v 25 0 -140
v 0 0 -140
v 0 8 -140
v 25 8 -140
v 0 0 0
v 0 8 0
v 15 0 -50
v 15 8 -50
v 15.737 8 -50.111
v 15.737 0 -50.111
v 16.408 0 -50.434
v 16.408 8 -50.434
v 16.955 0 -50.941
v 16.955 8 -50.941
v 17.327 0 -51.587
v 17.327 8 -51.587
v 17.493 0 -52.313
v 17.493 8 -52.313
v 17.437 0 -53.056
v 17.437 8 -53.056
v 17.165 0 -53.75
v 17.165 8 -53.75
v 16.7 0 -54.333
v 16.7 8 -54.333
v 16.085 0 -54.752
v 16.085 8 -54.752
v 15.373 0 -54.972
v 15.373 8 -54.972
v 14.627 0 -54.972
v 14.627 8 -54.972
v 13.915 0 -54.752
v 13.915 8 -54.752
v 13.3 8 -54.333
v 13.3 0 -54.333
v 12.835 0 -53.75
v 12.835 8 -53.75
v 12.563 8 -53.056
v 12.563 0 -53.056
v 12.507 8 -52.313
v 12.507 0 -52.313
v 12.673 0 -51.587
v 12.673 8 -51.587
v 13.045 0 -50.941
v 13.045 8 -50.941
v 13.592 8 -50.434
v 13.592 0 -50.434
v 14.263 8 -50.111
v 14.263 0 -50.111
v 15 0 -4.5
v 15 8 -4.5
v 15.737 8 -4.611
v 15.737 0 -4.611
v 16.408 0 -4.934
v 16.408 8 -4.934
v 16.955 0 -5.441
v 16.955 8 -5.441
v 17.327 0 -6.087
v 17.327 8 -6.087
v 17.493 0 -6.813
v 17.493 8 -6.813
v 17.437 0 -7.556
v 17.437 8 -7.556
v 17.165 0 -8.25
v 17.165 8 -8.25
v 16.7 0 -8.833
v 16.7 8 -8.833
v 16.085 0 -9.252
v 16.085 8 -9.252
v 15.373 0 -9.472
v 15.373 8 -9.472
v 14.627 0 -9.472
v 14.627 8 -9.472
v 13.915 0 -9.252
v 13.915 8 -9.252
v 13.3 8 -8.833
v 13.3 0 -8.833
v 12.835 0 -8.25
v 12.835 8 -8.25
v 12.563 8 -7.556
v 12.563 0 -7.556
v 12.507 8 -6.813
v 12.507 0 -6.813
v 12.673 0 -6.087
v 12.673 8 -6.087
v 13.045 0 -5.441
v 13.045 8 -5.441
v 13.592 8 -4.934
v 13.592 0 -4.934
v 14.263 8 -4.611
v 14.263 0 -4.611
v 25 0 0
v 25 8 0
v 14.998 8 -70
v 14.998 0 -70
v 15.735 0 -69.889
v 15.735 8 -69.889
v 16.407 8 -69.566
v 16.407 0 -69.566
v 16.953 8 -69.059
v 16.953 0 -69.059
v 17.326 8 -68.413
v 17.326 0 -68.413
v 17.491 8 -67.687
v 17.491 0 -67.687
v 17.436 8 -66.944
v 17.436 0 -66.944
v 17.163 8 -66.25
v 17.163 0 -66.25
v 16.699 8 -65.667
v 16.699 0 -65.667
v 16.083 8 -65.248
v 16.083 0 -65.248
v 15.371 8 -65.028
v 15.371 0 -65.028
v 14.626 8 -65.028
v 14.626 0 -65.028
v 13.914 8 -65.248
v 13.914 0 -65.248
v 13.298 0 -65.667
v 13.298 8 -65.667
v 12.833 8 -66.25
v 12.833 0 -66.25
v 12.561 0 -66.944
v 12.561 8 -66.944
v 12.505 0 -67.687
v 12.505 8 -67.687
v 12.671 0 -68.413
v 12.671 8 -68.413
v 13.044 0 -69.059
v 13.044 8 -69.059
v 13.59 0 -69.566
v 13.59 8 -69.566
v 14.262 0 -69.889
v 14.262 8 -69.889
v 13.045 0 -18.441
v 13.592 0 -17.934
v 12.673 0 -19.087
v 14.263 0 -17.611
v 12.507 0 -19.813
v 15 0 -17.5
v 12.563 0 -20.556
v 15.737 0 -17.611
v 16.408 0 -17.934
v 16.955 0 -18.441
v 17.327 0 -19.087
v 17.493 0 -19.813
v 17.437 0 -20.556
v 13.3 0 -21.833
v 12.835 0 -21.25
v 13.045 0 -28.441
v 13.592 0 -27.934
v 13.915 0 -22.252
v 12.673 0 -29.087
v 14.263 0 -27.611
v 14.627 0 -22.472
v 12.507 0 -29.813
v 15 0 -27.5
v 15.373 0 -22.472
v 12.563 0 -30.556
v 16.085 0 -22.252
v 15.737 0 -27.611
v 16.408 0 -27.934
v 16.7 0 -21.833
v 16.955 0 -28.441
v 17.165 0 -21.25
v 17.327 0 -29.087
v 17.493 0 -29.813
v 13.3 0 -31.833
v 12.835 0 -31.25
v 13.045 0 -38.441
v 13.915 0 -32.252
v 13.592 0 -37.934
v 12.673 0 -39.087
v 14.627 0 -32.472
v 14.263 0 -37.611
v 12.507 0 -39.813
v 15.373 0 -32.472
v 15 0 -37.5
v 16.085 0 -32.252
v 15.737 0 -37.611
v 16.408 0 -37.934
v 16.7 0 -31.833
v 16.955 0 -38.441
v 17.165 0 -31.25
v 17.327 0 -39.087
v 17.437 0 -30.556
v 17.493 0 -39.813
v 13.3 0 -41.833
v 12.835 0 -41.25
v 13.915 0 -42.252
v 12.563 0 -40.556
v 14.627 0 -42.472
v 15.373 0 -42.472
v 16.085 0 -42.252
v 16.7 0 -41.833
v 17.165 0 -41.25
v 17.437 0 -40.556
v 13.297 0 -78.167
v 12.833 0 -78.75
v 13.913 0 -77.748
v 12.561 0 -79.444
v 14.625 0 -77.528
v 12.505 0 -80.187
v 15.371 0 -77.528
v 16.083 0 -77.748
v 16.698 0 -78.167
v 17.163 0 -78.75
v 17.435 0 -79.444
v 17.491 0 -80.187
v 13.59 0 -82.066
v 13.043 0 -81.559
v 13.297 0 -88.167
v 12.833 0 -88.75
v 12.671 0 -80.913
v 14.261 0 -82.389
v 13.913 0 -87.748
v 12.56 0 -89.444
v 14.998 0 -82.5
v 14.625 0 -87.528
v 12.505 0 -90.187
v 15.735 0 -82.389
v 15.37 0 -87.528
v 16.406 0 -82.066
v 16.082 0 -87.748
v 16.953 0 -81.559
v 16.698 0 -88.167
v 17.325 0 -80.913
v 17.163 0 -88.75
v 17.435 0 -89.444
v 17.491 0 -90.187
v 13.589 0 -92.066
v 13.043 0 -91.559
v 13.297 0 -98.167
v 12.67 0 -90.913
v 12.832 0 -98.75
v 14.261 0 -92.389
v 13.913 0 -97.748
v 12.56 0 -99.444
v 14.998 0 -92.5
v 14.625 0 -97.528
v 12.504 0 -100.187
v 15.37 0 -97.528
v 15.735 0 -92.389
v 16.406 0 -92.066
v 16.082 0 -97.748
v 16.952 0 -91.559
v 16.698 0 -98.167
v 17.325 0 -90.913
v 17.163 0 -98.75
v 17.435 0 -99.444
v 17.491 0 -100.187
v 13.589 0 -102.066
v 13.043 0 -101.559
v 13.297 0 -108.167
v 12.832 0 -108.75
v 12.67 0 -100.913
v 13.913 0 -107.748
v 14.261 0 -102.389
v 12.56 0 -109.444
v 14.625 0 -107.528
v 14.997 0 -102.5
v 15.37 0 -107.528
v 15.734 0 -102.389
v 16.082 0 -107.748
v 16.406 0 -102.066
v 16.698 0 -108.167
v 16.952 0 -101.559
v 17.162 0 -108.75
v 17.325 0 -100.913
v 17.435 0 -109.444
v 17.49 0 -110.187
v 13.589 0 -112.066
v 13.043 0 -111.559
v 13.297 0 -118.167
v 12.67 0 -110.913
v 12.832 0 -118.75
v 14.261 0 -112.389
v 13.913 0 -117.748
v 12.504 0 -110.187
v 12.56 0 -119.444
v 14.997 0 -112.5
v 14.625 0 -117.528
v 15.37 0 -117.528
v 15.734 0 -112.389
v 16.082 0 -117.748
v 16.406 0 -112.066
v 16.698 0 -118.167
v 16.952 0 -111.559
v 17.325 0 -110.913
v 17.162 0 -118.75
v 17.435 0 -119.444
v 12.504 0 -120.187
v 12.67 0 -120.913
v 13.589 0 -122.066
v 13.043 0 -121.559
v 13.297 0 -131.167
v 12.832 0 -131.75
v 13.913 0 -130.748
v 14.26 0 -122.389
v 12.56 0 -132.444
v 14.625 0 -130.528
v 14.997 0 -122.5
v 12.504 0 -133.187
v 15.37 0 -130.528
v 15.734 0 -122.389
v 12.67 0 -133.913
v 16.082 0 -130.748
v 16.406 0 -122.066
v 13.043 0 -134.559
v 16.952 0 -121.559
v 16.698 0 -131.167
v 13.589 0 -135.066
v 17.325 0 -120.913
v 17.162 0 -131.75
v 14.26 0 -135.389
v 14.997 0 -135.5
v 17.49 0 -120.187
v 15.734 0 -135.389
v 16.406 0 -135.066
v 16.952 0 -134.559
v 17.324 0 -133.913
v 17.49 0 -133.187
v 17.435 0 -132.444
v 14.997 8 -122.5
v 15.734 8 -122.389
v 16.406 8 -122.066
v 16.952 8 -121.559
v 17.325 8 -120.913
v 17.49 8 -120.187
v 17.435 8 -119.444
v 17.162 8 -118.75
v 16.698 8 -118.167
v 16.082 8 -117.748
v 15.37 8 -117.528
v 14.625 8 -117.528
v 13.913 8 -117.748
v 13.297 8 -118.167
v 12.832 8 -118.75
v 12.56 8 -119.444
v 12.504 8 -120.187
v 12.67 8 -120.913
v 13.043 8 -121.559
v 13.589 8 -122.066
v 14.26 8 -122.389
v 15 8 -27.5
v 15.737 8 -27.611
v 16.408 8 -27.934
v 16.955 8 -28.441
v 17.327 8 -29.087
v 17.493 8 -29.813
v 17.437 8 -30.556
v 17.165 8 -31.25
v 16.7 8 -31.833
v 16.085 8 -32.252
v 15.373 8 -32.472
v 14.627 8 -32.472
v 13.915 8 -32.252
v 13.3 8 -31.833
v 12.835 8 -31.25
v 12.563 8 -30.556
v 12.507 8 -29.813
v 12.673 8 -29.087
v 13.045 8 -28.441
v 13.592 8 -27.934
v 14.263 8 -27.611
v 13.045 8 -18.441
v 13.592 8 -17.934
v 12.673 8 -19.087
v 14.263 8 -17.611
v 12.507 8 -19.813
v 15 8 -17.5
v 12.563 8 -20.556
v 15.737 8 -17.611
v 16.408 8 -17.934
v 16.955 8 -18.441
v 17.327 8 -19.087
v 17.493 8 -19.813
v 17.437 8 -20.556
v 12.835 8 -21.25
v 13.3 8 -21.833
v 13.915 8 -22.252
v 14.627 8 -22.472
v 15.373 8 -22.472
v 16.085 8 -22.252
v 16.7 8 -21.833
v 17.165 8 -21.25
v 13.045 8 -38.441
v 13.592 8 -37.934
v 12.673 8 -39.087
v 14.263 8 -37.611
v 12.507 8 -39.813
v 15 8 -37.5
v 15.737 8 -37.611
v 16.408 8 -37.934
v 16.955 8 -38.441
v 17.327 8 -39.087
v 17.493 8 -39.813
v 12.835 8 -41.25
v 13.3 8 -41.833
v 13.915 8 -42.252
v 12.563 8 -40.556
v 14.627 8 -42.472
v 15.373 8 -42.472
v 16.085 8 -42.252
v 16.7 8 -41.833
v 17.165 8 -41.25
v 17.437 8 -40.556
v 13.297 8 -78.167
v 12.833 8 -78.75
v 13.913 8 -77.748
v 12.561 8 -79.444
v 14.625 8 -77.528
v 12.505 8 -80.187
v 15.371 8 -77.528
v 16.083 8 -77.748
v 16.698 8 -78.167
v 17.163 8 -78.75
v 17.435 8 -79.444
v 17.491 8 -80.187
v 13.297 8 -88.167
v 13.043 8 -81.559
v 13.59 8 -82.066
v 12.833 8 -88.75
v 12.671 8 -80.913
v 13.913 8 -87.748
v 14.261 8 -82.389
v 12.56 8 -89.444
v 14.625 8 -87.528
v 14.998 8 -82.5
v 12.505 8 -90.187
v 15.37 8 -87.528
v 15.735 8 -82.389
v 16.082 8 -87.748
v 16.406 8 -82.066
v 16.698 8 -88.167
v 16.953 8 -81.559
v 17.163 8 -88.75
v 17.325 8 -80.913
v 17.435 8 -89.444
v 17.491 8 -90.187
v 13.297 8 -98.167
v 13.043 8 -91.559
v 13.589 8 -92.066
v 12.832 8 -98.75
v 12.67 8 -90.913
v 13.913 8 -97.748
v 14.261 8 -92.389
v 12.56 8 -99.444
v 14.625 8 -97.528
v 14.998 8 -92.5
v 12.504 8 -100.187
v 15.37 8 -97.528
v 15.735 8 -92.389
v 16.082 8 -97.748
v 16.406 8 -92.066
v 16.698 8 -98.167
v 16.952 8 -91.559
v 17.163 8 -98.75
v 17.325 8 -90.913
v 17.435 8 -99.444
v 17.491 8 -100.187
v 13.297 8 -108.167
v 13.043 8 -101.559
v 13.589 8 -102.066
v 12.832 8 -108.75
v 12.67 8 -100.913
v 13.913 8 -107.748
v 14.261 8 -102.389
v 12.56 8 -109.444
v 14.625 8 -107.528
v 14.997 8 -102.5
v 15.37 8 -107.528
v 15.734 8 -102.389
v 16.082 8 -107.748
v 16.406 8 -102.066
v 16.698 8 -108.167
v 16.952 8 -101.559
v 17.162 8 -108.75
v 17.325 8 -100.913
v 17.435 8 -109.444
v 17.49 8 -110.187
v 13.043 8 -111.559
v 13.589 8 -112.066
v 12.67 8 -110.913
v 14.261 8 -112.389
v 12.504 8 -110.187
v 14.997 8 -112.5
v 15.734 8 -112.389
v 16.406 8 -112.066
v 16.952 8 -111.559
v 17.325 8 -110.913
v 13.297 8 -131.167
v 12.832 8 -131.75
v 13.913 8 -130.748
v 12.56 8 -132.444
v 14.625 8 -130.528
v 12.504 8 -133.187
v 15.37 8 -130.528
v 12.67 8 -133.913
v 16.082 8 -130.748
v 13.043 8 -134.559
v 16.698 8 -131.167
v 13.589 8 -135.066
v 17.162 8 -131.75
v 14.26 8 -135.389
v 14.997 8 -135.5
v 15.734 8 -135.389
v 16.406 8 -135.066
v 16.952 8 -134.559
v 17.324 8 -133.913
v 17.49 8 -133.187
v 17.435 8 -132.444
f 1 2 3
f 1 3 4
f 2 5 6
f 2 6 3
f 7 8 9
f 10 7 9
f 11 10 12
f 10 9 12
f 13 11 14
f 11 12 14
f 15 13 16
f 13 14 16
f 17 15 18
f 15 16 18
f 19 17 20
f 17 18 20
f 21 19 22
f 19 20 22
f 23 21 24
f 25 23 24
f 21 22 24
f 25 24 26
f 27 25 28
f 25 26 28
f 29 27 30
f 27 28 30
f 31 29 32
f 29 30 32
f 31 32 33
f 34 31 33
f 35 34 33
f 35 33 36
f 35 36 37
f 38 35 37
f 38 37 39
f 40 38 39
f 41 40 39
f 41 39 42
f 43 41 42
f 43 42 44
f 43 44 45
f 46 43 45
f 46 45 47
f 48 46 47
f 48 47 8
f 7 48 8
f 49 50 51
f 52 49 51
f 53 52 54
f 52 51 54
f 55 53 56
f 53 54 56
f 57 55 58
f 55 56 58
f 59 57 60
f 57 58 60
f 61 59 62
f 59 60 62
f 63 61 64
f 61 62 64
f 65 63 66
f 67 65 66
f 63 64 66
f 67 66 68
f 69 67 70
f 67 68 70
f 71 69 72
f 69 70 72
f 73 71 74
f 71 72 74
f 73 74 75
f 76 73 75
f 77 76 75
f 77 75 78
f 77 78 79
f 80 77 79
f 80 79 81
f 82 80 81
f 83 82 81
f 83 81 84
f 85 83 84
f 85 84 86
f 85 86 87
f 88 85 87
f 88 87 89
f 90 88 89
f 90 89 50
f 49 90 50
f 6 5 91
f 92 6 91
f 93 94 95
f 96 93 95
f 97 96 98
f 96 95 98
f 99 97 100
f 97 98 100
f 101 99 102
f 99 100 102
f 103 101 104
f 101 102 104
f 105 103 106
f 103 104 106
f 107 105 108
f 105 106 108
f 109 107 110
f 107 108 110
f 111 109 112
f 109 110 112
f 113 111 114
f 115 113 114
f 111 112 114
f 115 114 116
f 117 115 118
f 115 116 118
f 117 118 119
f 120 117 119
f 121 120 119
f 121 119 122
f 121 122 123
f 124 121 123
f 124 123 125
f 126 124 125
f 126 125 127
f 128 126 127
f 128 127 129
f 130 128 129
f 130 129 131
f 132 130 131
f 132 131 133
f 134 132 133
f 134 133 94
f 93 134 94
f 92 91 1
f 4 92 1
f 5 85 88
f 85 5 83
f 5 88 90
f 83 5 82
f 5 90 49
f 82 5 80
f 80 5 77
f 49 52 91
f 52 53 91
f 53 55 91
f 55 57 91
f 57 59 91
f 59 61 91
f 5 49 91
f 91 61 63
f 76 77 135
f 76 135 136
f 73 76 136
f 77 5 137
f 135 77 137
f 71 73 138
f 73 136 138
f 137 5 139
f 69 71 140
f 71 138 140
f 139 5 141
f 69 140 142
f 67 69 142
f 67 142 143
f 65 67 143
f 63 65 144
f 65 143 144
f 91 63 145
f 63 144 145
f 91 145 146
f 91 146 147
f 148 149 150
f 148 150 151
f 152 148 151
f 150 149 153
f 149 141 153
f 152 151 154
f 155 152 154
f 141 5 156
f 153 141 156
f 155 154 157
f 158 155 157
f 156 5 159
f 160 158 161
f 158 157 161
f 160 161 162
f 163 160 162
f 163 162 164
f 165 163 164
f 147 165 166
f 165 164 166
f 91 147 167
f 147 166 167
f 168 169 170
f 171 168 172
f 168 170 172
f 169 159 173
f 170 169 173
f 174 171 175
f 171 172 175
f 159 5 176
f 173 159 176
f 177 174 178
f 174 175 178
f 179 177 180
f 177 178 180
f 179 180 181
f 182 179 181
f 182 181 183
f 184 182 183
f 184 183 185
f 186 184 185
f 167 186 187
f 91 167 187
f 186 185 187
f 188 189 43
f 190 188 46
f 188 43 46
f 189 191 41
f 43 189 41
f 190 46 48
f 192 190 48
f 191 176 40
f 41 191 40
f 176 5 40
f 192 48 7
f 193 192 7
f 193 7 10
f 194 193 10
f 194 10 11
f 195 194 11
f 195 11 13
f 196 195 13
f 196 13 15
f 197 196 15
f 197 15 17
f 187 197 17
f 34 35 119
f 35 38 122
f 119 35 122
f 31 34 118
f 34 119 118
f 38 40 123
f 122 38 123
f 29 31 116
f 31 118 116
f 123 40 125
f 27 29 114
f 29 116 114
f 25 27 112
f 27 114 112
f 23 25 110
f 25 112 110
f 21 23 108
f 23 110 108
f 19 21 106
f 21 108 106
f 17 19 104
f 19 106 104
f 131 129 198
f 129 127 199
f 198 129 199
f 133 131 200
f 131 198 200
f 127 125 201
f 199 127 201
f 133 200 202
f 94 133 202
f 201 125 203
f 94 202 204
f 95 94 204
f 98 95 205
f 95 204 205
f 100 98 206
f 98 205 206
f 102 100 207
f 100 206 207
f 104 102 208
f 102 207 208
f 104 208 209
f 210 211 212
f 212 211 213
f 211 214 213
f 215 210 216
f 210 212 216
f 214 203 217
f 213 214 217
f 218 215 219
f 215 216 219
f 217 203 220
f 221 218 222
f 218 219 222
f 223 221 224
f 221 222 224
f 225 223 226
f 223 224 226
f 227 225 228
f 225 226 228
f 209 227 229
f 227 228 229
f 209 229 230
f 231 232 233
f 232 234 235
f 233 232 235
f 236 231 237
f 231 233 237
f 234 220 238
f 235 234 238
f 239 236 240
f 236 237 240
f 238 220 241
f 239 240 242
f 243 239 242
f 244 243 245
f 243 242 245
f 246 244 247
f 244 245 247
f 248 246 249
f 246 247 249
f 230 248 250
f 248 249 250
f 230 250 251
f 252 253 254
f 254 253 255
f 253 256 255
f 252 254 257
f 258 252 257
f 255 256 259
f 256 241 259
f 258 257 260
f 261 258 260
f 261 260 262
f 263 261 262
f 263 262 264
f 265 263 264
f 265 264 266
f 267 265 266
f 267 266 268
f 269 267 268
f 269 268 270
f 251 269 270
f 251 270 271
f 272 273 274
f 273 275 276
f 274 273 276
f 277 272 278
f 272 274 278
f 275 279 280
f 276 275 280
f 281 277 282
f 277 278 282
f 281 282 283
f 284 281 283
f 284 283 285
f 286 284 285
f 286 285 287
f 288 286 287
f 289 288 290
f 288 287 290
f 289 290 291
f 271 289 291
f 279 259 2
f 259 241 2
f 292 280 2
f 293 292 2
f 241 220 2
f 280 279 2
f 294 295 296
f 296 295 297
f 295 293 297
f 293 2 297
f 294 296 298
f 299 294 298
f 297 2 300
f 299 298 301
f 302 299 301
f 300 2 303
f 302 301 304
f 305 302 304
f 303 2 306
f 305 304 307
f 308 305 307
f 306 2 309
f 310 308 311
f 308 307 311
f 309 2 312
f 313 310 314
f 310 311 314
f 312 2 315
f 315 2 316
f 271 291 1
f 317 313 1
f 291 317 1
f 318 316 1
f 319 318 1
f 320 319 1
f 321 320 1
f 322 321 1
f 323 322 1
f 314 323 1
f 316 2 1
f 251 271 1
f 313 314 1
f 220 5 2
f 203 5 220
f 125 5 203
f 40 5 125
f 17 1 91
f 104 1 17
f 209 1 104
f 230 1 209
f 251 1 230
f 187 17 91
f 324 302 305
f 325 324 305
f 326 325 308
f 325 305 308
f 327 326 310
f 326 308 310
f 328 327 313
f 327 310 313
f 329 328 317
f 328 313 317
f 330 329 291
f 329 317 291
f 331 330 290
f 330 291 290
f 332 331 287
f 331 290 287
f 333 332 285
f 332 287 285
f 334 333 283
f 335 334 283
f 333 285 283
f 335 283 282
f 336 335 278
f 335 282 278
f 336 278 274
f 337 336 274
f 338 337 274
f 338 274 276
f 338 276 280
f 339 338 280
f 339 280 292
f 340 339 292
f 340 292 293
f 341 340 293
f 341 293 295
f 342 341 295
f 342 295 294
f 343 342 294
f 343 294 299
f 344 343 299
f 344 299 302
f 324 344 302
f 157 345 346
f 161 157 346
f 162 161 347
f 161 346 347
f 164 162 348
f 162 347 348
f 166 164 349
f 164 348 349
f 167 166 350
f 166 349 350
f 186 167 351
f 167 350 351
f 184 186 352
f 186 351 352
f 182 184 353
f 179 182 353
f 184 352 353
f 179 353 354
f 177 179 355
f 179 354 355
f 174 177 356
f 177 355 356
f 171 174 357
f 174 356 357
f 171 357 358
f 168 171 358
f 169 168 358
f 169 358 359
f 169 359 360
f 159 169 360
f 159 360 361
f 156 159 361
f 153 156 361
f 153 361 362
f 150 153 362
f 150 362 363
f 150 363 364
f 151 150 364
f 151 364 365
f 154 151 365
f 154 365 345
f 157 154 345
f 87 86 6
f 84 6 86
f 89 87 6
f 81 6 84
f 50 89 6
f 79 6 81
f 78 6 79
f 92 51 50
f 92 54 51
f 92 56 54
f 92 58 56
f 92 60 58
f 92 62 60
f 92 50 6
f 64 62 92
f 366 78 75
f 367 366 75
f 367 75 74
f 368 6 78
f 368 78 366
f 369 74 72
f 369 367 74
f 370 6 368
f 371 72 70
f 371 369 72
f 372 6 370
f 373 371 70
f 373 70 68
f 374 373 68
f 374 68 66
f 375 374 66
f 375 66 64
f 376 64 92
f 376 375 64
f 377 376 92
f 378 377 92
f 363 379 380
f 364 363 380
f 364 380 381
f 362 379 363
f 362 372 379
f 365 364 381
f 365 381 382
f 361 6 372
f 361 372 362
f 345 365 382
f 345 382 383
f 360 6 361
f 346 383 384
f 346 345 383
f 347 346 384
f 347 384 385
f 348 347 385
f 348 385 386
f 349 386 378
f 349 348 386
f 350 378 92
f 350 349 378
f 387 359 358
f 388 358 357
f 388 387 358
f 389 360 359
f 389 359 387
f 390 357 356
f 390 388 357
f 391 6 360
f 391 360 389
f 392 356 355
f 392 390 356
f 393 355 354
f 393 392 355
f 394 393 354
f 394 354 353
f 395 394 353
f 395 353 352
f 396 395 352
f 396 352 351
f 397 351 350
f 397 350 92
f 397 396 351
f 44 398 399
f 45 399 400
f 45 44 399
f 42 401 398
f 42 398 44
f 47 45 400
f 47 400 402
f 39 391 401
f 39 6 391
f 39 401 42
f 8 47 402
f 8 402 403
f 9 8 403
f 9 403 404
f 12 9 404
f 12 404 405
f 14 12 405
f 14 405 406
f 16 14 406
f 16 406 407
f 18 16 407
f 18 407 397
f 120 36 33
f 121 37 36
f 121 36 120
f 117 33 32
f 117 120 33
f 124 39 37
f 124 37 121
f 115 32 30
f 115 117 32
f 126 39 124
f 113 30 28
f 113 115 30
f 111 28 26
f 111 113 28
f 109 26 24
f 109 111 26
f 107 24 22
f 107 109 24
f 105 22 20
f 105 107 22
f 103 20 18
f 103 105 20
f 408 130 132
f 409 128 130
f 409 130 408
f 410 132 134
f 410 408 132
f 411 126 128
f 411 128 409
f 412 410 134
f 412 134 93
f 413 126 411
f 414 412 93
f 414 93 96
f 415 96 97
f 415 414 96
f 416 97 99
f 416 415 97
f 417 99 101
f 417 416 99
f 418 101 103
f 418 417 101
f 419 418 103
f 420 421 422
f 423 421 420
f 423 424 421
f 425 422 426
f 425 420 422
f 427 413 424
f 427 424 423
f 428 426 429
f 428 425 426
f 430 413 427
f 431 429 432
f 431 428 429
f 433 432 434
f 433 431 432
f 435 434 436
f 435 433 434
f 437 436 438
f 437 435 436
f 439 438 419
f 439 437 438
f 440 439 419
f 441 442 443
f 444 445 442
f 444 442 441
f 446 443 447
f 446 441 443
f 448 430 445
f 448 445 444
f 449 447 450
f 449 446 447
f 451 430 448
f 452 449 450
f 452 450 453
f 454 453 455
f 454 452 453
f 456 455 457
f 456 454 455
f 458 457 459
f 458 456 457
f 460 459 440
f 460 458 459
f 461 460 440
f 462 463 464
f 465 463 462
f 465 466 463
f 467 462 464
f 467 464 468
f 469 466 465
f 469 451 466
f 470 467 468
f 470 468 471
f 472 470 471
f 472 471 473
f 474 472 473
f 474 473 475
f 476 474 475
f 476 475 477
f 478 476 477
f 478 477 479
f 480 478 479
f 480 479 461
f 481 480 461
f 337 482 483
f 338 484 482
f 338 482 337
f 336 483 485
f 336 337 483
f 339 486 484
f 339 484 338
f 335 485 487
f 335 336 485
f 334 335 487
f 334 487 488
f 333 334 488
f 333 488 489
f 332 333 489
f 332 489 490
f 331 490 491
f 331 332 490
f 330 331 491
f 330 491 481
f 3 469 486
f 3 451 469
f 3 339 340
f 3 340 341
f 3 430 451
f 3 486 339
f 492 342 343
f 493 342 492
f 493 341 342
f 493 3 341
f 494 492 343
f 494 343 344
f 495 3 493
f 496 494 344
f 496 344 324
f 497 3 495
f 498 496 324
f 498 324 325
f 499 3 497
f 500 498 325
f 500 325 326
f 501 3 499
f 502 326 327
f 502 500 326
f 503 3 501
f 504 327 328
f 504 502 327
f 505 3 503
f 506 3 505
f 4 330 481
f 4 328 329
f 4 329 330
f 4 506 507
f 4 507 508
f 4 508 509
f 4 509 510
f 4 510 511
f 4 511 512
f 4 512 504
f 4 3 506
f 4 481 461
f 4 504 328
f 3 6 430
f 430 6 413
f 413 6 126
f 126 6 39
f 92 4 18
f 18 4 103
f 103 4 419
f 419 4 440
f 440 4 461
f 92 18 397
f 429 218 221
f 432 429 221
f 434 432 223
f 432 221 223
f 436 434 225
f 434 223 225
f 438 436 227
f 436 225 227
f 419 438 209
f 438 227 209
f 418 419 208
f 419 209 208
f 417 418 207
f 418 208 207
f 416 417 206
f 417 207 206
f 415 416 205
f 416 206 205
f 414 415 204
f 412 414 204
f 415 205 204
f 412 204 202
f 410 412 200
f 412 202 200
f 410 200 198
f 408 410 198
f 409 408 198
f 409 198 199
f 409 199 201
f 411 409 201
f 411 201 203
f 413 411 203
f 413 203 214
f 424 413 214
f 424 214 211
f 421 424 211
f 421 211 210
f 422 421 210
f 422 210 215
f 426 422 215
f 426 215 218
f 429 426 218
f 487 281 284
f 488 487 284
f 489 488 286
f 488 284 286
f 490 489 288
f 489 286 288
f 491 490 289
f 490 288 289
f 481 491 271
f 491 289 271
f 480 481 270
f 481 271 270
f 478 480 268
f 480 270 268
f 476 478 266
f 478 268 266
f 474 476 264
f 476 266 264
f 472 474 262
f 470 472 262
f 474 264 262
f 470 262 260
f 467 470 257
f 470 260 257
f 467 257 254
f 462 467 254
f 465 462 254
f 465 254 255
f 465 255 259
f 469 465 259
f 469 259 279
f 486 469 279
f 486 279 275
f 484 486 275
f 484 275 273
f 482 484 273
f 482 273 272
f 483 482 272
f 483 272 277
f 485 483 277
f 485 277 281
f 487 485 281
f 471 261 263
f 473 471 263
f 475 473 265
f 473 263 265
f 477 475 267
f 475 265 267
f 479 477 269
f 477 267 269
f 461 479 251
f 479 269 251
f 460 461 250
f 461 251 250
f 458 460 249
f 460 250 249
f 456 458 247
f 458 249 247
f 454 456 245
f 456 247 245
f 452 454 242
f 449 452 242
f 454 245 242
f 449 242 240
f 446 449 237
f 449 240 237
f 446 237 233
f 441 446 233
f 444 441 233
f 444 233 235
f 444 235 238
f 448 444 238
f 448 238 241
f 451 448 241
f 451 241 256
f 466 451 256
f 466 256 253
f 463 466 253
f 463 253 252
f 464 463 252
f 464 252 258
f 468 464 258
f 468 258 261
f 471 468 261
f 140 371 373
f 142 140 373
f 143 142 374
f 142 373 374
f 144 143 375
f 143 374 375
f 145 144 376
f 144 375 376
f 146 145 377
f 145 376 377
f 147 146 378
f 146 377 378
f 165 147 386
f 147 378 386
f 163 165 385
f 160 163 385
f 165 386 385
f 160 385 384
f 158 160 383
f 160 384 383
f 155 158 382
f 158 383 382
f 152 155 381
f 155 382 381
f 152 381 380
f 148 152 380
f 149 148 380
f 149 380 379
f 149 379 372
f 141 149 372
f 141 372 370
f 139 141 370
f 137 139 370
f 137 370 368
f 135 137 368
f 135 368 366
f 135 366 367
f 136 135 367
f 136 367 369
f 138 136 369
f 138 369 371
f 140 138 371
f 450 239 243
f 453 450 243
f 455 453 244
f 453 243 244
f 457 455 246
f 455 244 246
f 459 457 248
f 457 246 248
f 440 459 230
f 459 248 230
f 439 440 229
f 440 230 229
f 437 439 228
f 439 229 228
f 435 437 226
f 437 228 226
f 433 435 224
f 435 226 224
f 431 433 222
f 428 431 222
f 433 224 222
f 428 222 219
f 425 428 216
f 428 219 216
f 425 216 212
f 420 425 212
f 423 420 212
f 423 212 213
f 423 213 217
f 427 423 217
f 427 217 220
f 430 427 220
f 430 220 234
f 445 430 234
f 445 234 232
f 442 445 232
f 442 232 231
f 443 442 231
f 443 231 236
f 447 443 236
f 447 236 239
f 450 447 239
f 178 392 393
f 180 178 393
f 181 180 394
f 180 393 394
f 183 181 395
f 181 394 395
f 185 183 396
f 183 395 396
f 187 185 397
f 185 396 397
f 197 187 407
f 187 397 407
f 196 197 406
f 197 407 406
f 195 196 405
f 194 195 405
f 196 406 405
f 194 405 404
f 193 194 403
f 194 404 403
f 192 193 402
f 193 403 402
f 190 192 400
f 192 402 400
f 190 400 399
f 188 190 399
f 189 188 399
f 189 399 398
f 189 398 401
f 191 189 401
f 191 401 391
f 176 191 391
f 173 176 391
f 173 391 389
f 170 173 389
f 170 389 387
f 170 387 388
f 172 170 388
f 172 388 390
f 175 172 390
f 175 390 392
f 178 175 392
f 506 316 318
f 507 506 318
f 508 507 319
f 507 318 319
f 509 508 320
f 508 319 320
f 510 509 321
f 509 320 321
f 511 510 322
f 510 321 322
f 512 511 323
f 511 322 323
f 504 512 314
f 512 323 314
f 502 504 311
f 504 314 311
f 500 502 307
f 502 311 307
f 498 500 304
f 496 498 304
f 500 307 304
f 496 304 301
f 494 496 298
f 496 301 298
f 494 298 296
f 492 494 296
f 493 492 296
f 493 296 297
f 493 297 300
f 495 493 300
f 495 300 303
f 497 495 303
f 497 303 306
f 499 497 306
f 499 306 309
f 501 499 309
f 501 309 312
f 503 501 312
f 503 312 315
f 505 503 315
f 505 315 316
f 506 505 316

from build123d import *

# Parameters (mm, degrees)
SKETCH1_W           = 25
SKETCH1_H           = 140
BOSS_EXTRUDE1_DEPTH = 8
SKETCH2_R           = 2.5
CUT_EXTRUDE1_DEPTH  = 143.439460825
SKETCH3_R           = 2.5
CUT_EXTRUDE2_DEPTH  = 143.439460825


with BuildPart() as part:
    # Sketch1 → Boss-Extrude1 (new body)
    with BuildSketch(Plane(origin=(0, 0, 0), x_dir=(1, 0, 0), z_dir=(0, 1, 0))):
        with Locations((12.5, 70)):
            Rectangle(SKETCH1_W, SKETCH1_H)
    extrude(amount=BOSS_EXTRUDE1_DEPTH)

    # Sketch2 → Cut-Extrude1 (cut, through all)
    with BuildSketch(Plane(origin=(0, 8, 0), x_dir=(1, 0, 0), z_dir=(0, 1, 0))):
        with Locations(Location((15, 7, 0), (0, 0, 270))):
            Circle(SKETCH2_R)
        with Locations(Location((15, 20, 0), (0, 0, 270))):
            Circle(SKETCH2_R)
        with Locations(Location((15, 30, 0), (0, 0, 270))):
            Circle(SKETCH2_R)
        with Locations(Location((15, 40, 0), (0, 0, 270))):
            Circle(SKETCH2_R)
        with Locations(Location((15, 52.5, 0), (0, 0, 270))):
            Circle(SKETCH2_R)
    extrude(amount=-CUT_EXTRUDE1_DEPTH, mode=Mode.SUBTRACT)

    # Sketch3 → Cut-Extrude2 (cut, through all)
    with BuildSketch(Plane(origin=(0, 0, 0), x_dir=(-1, 0, 0), z_dir=(0, -1, 0))):
        with Locations(Location((-14.998416969, 67.499999916, 0), (0, 0, 90))):
            Circle(SKETCH3_R)
        with Locations(Location((-14.997923514, 79.999999907, 0), (0, 0, 90))):
            Circle(SKETCH3_R)
        with Locations(Location((-14.997645062, 89.999999903, 0), (0, 0, 90))):
            Circle(SKETCH3_R)
        with Locations(Location((-14.997495222, 99.999999902, 0), (0, 0, 90))):
            Circle(SKETCH3_R)
        with Locations(Location((-14.99739352, 109.999999901, 0), (0, 0, 90))):
            Circle(SKETCH3_R)
        with Locations(Location((-14.997327839, 119.999999901, 0), (0, 0, 90))):
            Circle(SKETCH3_R)
        with Locations(Location((-14.997270403, 132.999999901, 0), (0, 0, 90))):
            Circle(SKETCH3_R)
    extrude(amount=-CUT_EXTRUDE2_DEPTH, mode=Mode.SUBTRACT)


solid = part.part
